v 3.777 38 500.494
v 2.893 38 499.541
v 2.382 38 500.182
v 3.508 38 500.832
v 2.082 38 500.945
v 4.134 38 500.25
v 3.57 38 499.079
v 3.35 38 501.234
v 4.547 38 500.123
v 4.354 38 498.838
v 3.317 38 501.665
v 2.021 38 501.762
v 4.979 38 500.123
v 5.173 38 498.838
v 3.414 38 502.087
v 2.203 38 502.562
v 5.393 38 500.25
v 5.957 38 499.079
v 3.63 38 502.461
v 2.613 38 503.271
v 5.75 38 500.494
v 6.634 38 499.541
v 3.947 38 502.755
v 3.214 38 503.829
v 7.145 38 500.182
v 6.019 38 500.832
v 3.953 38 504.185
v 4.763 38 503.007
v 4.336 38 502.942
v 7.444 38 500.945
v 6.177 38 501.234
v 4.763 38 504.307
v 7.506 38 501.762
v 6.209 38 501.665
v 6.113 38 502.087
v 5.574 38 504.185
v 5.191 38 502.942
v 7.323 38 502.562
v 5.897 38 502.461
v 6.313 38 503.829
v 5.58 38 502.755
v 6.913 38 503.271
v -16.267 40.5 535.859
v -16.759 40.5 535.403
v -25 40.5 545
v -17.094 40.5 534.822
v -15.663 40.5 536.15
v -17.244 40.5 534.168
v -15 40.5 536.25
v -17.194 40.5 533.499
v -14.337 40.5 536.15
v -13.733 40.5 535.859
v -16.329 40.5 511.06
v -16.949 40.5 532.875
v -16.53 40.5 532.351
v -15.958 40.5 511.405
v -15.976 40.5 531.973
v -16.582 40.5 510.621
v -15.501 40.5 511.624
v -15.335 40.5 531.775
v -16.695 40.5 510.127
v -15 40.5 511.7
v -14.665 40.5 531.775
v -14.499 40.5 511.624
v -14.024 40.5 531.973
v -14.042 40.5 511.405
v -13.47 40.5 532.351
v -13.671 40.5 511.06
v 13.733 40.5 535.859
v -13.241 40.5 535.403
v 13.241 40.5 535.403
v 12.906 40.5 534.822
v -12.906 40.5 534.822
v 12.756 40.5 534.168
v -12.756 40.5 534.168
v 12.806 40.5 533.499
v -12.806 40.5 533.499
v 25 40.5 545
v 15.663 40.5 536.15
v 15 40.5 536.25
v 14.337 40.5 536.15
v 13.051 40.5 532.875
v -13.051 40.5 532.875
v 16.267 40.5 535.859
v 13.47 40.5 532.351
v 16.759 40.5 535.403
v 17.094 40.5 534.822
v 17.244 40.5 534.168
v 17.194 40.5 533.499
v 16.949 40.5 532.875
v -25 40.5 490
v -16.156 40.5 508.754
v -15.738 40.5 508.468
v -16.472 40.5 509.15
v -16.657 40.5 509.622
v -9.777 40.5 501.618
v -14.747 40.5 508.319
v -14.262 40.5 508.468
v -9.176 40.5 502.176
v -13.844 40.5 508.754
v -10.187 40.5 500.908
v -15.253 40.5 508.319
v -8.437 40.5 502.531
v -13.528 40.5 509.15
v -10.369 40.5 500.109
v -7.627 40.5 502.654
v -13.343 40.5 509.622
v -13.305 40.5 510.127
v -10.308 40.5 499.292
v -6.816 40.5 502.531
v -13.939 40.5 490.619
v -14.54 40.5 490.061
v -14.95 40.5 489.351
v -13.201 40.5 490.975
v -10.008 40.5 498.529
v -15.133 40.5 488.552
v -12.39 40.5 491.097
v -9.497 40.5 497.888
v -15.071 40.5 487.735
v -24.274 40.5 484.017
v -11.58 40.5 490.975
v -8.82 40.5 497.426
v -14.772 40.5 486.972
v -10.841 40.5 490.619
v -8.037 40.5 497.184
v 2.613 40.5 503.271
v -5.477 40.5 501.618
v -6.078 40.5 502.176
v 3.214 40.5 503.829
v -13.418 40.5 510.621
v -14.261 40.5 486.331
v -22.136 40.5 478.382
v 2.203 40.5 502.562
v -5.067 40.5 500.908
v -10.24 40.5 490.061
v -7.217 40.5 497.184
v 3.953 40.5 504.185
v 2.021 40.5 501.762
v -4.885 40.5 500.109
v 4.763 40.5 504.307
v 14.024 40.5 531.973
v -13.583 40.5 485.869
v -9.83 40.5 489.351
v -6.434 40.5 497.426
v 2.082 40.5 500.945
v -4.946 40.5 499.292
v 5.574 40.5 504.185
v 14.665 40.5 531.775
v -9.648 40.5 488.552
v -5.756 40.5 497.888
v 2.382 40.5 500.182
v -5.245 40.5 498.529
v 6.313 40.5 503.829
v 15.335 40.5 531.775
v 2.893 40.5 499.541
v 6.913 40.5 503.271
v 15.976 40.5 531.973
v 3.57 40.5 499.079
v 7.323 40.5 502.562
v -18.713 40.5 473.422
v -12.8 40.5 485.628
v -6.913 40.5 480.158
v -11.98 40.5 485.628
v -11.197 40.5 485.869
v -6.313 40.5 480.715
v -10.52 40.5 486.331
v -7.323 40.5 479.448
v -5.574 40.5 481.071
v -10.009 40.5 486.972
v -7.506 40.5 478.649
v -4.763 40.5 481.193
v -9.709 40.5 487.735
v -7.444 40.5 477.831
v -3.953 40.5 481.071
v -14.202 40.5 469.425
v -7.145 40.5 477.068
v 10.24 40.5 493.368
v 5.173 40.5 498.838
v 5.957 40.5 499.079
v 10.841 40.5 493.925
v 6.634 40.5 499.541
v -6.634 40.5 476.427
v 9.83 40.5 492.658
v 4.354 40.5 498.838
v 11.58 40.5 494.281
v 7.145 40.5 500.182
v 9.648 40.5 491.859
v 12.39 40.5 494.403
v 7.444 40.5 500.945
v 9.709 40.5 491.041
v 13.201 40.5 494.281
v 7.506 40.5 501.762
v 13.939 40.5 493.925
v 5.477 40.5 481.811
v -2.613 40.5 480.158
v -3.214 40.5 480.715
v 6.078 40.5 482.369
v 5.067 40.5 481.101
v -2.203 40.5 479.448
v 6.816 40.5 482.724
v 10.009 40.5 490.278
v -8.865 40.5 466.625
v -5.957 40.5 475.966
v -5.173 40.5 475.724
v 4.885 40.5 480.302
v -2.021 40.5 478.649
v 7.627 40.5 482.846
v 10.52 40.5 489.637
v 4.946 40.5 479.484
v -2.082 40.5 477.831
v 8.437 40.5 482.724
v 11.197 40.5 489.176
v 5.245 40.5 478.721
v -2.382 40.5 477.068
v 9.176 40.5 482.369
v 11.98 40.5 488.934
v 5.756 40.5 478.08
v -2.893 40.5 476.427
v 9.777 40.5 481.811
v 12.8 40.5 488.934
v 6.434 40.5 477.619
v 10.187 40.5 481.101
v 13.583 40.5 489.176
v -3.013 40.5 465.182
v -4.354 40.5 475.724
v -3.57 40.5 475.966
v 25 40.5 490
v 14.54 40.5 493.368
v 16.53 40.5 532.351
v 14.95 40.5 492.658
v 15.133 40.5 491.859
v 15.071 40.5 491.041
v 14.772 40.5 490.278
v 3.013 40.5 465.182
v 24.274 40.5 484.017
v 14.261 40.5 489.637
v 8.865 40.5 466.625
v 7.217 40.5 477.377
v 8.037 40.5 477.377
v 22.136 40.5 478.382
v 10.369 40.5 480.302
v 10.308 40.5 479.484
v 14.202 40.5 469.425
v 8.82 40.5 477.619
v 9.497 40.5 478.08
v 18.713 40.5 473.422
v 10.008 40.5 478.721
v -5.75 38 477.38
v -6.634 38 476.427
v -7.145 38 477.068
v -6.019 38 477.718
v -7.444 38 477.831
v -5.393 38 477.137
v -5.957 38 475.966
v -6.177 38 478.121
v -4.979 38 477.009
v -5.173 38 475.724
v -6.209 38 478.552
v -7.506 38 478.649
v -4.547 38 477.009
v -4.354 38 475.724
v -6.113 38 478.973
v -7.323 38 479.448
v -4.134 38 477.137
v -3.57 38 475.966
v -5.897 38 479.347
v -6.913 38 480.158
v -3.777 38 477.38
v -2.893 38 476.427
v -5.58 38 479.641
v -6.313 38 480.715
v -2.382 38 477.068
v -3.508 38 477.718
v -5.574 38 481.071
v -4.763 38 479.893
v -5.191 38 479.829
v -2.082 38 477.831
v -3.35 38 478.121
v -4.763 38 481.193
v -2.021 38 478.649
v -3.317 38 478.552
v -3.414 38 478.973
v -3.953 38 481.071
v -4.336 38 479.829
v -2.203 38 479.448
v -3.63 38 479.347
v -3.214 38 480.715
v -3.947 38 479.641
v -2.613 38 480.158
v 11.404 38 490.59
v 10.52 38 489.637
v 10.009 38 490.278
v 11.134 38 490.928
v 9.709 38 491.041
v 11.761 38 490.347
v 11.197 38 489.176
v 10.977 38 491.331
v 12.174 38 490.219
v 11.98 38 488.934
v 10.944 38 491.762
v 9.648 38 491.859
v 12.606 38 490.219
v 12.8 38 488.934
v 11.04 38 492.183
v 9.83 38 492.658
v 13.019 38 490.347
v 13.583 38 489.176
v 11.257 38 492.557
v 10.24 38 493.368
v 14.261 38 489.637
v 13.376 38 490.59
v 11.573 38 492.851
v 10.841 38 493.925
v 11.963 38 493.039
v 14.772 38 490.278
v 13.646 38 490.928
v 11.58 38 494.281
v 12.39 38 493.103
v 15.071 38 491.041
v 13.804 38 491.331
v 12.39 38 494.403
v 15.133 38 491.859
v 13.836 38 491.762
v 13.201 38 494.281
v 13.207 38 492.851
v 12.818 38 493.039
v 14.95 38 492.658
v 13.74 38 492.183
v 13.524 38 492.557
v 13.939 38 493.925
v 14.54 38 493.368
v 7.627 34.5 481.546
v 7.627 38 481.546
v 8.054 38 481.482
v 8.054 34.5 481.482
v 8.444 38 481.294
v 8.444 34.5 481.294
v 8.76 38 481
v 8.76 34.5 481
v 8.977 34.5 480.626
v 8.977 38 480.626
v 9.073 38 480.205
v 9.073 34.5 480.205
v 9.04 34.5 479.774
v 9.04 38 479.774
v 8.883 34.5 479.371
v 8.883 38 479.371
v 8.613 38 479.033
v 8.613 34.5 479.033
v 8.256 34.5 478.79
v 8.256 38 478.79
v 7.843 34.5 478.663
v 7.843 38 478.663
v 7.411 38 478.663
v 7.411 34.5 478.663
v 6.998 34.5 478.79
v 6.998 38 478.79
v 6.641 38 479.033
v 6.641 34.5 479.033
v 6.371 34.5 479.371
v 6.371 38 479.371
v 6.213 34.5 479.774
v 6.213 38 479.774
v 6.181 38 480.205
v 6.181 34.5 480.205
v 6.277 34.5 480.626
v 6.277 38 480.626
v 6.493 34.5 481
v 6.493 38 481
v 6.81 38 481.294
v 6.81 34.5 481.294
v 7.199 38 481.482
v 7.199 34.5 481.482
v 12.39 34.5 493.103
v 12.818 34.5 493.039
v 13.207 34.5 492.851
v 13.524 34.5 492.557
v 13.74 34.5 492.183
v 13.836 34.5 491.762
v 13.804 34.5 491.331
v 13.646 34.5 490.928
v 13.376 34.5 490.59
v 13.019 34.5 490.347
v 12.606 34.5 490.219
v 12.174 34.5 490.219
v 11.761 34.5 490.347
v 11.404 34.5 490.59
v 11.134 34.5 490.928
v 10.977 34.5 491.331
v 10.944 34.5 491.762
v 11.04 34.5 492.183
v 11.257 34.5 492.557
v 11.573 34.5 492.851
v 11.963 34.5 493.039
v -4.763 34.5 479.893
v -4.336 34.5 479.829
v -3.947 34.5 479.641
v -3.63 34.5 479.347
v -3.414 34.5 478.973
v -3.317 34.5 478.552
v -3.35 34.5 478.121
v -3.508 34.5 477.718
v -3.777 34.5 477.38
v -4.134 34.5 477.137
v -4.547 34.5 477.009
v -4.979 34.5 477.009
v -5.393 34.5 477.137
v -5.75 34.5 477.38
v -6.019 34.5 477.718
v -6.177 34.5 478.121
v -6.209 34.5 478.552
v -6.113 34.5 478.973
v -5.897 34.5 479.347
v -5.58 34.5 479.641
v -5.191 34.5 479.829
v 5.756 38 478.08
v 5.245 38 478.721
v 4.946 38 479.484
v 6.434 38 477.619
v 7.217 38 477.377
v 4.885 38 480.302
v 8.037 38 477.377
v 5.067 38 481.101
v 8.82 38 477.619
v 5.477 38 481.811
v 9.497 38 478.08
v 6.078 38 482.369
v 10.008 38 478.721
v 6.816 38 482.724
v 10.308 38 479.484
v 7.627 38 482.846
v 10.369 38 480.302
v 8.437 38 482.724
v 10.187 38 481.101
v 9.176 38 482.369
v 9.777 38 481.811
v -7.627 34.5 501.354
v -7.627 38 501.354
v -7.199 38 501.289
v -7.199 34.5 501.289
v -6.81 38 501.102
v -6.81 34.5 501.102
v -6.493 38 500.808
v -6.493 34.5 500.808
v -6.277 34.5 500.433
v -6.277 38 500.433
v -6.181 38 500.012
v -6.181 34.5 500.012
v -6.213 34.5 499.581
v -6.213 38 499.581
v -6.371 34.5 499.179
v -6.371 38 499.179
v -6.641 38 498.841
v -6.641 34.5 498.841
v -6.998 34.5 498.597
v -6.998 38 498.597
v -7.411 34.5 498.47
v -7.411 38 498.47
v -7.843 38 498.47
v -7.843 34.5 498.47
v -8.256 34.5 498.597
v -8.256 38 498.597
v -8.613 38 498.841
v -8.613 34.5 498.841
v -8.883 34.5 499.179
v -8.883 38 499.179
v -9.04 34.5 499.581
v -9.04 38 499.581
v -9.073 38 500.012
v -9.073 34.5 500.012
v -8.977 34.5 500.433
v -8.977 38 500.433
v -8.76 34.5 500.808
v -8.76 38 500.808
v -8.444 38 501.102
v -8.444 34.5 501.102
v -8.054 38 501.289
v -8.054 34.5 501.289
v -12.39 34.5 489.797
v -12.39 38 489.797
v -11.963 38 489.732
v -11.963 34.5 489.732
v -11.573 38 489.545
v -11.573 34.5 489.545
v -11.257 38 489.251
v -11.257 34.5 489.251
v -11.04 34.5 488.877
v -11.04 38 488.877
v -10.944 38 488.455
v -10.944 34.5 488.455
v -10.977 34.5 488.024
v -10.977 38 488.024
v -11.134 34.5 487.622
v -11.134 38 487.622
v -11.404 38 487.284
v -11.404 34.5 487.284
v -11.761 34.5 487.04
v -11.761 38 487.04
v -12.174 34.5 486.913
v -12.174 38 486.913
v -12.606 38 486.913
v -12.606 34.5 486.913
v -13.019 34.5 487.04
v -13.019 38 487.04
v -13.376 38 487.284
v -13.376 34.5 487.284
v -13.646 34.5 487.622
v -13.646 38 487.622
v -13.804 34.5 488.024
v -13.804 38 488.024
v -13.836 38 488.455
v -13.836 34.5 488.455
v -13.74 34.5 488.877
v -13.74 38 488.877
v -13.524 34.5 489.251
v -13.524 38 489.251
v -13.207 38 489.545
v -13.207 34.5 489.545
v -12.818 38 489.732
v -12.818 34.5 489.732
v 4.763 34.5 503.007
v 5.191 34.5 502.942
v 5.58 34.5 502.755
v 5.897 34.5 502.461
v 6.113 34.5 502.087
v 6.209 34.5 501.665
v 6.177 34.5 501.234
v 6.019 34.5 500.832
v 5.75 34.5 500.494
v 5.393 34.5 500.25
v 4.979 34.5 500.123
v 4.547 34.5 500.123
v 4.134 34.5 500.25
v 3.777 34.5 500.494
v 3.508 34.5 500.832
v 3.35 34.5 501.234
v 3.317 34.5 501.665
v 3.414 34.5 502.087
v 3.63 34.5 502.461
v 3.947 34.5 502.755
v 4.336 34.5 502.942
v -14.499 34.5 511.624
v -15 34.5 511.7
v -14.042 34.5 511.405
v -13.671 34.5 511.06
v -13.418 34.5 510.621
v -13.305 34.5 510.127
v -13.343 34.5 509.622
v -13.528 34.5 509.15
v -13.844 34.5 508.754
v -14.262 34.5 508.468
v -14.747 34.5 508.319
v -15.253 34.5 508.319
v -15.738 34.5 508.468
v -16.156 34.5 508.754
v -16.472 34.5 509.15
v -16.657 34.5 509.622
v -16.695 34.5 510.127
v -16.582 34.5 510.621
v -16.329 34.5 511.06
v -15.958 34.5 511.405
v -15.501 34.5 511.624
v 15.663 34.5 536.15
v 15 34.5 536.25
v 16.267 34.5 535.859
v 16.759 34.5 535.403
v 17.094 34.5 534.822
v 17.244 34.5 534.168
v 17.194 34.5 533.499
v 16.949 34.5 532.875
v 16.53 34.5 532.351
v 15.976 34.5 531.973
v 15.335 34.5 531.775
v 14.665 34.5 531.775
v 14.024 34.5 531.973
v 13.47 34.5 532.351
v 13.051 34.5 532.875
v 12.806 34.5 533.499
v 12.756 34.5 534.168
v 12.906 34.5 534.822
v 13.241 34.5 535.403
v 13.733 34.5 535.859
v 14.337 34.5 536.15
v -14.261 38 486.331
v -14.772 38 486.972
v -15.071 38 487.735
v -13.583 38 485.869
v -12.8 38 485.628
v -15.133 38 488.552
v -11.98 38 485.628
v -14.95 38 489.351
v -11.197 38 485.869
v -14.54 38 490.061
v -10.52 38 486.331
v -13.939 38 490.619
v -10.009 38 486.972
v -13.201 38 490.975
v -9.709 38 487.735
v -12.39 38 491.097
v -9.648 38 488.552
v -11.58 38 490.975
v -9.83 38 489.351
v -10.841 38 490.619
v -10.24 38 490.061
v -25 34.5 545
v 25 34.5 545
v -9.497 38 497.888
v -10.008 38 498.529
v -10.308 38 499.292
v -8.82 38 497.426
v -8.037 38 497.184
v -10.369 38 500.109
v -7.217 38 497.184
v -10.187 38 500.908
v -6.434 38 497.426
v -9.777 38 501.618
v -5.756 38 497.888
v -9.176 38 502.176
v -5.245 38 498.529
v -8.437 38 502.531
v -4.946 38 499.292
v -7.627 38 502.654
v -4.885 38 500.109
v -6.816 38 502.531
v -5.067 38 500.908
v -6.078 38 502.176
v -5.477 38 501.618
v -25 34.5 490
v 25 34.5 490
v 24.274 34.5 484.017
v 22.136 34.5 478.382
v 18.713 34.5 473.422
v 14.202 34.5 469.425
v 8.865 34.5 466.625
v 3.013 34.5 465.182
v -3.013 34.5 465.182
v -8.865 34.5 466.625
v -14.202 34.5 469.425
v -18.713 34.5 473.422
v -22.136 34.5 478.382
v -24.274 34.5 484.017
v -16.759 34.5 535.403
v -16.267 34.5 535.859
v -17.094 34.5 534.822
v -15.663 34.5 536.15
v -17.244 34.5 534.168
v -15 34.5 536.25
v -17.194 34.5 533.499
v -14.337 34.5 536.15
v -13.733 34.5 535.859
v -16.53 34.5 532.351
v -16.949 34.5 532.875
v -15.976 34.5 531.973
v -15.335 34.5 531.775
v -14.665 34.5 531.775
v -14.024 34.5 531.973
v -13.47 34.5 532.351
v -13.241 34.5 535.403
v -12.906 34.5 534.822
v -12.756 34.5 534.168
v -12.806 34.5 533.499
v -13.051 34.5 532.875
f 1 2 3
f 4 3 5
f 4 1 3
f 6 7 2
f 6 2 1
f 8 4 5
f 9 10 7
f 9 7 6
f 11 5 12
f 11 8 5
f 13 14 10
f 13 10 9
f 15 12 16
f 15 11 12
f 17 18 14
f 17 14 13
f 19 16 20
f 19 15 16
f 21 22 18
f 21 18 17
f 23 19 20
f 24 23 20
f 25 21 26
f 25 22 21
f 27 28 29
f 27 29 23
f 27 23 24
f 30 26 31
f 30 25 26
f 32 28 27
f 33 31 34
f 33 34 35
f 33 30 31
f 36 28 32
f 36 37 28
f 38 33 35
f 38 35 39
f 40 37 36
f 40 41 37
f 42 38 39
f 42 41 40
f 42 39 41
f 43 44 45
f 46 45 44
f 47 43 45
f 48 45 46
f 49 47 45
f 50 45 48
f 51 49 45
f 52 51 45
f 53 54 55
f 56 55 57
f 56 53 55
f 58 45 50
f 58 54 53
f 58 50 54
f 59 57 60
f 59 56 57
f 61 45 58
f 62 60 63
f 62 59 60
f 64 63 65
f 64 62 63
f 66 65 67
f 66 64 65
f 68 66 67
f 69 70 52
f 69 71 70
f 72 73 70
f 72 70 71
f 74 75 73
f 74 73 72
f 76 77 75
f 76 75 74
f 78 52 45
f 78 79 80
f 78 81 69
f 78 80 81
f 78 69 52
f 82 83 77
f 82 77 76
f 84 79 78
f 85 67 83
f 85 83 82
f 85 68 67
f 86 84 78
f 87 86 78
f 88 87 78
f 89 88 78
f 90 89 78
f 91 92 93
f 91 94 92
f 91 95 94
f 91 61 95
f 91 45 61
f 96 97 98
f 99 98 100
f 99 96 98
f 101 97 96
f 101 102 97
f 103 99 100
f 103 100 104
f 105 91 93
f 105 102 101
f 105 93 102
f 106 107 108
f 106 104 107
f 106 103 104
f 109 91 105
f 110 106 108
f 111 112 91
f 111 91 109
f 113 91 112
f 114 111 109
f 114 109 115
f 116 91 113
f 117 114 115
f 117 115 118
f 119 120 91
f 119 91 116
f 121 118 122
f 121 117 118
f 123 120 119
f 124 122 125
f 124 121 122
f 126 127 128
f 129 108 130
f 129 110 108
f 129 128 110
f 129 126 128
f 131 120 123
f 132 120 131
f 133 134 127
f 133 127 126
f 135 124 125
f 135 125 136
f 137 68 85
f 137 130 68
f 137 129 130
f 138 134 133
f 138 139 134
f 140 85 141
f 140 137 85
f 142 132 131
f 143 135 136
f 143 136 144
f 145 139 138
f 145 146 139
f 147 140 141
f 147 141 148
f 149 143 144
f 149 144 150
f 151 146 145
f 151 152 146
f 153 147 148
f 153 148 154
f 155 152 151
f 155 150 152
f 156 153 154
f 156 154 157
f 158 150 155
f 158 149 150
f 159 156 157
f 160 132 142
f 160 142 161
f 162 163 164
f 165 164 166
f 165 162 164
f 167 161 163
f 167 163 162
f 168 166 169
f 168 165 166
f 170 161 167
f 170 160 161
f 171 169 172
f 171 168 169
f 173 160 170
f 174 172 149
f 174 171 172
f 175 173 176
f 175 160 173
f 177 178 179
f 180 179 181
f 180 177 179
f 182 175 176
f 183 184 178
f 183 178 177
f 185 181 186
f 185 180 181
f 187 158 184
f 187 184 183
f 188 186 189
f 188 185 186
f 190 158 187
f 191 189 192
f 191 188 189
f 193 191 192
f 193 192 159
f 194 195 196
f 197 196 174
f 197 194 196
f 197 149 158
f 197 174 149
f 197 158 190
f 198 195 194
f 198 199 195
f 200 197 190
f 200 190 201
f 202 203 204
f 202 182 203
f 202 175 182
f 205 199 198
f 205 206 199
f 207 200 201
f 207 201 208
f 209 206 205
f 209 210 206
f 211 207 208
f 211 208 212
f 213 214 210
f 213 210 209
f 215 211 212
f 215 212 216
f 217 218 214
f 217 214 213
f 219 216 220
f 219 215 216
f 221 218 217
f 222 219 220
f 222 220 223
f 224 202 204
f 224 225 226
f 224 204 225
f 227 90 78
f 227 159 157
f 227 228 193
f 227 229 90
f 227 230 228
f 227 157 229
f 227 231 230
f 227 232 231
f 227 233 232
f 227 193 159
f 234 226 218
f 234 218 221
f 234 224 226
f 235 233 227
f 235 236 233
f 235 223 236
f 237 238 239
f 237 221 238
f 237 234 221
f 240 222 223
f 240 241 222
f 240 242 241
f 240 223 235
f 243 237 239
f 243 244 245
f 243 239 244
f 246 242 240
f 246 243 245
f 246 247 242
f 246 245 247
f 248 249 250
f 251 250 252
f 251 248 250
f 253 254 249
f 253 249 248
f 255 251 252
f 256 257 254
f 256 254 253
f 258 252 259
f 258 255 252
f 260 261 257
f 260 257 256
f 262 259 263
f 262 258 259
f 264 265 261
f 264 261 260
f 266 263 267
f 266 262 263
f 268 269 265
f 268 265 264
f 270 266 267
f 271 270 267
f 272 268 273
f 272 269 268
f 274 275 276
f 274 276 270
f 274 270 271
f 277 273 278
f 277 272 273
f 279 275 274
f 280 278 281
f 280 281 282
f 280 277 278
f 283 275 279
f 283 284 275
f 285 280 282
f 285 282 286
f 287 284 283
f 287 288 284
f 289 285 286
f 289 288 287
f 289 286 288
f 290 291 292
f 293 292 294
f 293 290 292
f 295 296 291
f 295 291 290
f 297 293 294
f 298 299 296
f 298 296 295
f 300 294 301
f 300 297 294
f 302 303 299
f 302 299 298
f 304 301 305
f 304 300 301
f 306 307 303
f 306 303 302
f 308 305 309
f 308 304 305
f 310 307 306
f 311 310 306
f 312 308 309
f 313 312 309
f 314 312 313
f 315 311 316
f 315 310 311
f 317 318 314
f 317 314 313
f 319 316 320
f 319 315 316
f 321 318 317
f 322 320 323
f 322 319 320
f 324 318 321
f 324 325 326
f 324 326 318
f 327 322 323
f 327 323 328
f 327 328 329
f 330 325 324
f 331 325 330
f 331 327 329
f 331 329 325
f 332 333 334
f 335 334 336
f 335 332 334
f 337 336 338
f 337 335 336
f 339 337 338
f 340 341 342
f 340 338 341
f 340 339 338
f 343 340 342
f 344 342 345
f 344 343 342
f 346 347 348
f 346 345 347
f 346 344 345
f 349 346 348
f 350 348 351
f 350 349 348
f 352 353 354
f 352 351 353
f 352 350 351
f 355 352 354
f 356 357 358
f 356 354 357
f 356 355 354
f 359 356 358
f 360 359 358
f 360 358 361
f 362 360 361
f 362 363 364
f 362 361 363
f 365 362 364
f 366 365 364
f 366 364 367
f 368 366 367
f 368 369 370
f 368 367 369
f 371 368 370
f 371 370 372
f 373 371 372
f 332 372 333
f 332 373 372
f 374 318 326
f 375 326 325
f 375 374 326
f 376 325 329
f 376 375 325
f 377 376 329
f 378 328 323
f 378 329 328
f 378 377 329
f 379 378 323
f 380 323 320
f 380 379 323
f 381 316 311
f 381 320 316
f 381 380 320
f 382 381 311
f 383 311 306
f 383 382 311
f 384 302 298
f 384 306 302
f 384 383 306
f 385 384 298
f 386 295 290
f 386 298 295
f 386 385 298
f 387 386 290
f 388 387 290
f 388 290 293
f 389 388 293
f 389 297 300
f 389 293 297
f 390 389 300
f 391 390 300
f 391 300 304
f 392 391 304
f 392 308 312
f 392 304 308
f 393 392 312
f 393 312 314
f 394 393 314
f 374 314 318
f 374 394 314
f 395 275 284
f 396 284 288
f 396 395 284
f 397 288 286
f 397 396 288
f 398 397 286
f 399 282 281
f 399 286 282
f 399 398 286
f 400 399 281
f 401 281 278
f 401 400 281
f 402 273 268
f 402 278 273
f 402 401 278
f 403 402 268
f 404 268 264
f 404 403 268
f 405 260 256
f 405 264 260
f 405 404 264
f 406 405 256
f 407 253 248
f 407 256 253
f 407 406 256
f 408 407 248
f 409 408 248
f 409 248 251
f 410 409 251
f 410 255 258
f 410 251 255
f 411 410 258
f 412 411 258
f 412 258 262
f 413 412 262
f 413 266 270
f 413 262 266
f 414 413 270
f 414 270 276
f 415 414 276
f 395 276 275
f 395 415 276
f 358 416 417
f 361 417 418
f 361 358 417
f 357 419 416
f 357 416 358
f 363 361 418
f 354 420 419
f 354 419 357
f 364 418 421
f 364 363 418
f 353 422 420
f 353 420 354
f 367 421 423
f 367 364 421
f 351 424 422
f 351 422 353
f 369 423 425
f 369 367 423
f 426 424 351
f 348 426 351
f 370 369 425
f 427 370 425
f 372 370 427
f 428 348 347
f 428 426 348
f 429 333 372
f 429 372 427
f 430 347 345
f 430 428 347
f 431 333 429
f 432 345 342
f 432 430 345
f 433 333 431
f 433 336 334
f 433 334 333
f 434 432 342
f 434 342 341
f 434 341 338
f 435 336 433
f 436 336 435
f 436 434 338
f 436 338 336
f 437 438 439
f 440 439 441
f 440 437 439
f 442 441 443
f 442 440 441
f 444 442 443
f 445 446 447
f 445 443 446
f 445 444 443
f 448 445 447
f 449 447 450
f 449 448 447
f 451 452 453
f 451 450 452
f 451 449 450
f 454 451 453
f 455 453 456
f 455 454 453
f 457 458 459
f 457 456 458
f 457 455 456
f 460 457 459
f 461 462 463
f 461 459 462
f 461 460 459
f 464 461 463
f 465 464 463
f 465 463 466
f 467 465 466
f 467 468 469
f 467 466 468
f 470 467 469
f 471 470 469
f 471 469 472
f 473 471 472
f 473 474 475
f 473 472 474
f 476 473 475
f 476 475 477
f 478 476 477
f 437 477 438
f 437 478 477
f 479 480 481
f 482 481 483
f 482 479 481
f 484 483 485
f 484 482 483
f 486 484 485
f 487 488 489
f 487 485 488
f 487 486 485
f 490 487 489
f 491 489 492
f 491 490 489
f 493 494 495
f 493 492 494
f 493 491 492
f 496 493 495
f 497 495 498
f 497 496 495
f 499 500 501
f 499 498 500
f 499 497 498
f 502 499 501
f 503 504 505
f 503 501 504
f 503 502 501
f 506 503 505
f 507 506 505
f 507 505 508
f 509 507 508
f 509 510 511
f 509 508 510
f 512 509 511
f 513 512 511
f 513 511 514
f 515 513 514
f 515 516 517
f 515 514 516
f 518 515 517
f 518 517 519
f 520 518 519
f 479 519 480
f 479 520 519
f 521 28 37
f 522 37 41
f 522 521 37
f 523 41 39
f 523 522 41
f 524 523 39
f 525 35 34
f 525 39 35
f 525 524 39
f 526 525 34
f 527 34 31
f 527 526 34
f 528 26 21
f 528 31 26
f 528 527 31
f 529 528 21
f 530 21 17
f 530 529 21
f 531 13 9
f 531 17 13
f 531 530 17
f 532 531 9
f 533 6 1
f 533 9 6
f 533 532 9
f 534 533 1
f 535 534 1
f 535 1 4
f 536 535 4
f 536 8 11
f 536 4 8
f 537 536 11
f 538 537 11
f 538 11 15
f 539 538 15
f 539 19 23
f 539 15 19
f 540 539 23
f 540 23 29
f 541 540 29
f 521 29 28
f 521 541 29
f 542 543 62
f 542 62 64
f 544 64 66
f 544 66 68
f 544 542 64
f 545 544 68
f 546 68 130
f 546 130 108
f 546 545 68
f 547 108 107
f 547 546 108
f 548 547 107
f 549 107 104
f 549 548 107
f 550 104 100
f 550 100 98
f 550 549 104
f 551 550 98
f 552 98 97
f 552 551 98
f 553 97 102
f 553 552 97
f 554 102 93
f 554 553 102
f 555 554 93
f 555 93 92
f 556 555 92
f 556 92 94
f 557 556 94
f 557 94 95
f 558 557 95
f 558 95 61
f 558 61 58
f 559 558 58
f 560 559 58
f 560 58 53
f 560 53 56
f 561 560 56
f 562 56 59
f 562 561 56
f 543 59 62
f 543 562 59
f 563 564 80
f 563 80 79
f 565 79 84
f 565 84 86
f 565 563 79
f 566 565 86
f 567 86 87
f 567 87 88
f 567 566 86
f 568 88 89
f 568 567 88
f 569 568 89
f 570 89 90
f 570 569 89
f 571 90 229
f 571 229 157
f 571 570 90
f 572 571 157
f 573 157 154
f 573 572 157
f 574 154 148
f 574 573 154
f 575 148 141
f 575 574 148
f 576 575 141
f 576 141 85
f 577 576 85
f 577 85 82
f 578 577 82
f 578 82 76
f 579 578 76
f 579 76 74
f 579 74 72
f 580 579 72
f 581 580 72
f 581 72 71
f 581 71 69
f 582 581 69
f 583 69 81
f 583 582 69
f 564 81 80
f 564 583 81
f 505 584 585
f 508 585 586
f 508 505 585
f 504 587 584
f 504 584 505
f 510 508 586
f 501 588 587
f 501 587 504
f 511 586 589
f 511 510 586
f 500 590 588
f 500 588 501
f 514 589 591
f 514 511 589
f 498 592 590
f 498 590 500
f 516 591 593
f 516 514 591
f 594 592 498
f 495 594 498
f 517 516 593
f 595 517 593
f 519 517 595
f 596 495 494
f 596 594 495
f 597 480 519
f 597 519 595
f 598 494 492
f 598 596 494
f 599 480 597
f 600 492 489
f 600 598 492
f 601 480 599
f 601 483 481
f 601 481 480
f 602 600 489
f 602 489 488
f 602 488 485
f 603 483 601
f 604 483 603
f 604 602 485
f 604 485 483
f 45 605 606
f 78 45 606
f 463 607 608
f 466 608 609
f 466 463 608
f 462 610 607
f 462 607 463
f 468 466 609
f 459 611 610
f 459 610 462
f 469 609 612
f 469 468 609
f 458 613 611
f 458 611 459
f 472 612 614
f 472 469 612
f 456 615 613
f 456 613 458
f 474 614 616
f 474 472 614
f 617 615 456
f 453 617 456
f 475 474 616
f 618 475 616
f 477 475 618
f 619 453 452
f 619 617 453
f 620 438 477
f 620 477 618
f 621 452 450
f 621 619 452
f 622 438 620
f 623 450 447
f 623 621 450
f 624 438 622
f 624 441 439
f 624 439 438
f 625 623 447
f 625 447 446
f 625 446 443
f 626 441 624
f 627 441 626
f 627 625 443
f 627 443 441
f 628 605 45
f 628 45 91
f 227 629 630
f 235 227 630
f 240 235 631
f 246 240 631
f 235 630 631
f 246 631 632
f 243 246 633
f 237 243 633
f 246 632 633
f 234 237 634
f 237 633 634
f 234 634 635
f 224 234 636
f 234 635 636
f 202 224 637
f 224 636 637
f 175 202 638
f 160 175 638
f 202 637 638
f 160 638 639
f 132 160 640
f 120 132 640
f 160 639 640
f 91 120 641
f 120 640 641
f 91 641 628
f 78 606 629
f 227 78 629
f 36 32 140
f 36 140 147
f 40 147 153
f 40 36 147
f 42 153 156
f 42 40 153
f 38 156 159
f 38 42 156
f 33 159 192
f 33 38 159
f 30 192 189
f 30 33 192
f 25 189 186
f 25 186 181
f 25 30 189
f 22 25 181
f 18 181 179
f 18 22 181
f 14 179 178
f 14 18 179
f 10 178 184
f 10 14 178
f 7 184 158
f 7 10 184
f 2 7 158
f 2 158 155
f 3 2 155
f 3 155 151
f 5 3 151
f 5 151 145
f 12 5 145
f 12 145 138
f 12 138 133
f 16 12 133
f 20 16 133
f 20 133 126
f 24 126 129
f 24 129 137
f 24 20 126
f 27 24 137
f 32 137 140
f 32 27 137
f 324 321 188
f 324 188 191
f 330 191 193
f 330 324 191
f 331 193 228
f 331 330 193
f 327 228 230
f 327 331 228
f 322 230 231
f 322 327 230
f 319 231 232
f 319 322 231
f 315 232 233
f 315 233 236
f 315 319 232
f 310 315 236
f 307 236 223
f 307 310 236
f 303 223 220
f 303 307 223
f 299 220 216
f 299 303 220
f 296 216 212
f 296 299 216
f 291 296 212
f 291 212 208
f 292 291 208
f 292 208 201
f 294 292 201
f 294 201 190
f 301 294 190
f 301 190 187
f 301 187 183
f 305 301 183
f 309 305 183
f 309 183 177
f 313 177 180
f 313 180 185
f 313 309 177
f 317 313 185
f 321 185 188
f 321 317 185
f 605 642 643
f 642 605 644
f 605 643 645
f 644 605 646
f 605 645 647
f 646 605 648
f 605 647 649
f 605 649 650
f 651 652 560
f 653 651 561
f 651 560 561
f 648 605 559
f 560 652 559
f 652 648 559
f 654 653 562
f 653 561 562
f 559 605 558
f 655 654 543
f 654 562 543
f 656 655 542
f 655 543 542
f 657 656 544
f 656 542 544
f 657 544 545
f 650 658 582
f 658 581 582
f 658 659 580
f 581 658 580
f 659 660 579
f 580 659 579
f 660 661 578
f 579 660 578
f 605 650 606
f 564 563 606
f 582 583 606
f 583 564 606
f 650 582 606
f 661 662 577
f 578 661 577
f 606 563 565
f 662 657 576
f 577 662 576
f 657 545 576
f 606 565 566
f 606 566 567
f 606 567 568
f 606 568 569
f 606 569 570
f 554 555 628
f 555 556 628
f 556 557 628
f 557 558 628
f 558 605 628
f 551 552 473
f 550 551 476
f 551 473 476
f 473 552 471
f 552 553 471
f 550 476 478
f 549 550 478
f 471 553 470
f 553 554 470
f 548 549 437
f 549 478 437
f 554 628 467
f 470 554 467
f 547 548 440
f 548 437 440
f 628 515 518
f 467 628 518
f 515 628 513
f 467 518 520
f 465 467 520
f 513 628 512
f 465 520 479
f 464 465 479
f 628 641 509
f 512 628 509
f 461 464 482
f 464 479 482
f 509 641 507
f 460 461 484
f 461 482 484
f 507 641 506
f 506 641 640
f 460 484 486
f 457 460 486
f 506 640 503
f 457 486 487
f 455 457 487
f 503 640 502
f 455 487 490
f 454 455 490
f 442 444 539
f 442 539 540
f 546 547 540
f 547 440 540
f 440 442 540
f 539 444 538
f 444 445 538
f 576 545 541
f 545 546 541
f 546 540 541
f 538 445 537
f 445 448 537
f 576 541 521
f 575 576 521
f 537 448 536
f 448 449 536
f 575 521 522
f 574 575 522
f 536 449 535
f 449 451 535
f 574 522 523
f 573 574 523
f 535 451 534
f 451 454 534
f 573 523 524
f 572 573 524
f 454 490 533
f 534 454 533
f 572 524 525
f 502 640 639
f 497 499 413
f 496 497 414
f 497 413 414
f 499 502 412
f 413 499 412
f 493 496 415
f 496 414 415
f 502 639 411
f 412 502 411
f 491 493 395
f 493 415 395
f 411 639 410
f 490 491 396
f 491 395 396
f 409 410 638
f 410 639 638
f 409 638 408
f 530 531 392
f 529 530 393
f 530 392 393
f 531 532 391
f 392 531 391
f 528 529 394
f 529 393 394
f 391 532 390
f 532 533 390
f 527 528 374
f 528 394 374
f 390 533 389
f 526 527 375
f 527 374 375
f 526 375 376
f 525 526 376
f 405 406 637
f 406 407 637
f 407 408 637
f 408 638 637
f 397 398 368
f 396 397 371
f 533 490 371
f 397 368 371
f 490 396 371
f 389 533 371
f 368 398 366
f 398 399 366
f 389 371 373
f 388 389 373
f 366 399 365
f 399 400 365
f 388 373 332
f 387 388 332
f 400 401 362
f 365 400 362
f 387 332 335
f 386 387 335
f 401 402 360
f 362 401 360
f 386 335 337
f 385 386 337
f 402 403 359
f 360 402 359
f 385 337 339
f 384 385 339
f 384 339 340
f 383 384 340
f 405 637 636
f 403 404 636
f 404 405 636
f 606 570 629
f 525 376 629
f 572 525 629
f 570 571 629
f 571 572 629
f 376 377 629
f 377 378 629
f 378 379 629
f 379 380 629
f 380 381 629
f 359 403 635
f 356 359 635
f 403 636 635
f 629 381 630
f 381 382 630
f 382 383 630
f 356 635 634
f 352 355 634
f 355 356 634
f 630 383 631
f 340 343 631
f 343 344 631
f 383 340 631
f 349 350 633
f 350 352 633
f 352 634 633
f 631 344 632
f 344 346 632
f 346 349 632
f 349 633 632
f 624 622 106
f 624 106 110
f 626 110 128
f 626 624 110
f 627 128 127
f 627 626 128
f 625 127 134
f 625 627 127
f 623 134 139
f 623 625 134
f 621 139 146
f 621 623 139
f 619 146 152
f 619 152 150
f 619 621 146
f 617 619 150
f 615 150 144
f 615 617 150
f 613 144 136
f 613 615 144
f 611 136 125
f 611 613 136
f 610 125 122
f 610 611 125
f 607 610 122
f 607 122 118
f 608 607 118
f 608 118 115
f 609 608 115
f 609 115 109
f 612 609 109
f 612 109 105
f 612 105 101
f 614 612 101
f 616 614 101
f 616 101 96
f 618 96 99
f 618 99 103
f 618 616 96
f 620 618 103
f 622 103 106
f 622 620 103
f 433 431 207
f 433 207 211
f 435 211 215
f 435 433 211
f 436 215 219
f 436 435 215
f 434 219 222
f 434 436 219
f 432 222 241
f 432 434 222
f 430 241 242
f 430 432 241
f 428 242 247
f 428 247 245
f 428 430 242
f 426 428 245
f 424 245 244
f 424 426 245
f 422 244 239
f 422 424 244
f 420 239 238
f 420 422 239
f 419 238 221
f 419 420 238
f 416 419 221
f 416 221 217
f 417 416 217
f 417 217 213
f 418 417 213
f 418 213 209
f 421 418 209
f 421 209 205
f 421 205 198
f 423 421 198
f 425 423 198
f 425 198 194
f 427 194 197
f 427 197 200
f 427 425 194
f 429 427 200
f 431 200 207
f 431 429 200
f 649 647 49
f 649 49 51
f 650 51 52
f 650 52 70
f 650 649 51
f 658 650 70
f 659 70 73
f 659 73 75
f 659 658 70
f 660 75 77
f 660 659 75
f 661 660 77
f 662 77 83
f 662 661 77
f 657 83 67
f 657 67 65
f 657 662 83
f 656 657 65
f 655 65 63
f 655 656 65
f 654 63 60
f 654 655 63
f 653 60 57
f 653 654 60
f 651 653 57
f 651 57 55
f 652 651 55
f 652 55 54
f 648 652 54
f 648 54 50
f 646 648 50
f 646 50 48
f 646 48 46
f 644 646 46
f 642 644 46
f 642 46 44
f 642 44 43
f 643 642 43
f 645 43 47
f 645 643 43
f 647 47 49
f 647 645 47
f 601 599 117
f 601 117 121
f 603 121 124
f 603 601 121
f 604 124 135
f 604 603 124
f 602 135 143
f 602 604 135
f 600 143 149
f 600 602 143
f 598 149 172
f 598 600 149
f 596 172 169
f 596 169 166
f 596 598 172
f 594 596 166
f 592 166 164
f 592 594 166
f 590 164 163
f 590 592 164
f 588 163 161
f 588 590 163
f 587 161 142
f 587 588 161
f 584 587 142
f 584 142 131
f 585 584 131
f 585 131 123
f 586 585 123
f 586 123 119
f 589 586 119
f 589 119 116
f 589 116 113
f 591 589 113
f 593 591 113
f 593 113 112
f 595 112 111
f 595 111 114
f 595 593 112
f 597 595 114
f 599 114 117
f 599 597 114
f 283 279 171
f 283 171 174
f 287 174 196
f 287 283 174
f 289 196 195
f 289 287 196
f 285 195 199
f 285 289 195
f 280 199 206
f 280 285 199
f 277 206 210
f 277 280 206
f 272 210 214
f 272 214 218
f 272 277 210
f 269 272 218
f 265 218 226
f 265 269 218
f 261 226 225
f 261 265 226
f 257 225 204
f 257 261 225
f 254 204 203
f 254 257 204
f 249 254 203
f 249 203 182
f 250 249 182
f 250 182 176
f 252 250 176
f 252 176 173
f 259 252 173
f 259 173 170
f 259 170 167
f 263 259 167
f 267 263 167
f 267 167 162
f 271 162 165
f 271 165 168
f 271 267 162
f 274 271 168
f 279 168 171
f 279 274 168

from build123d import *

# Parameters (mm, degrees)
PLACA_START                 = 34.5
SK_PLACA_W                  = 50
SK_PLACA_H                  = 36
PLACA_DEPTH                 = 6
EXTREMO_START               = 34.5
SK_EXTREMO_R                = 25
EXTREMO_DEPTH               = 6
PASANTES_M2_5_CUBO_J5_START = 34.5
SK_PASANTES_M2_5_CUBO_J5_R  = 1.45
PASANTES_M2_5_CUBO_J5_DEPTH = 6
CAJAS_M2_5_J5_START         = 38
SK_CAJAS_M2_5_J5_R          = 2.75
CAJAS_M2_5_J5_DEPTH         = 2.5
EXTENSION_PESTANAS_START    = 34.5
SK_EXTENSION_PESTANAS_W     = 50
SK_EXTENSION_PESTANAS_H     = 19
EXTENSION_PESTANAS_DEPTH    = 6
PASANTES_M4_REPISA_START    = 34.5
SK_PASANTES_M4_REPISA_R     = 2.25
PASANTES_M4_REPISA_DEPTH    = 6
PASANTE_M3_CINCHO_START     = 34.5
SK_PASANTE_M3_CINCHO_R      = 1.7
PASANTE_M3_CINCHO_DEPTH     = 6


with BuildPart() as part:
    # Sk_Placa → Placa (new body)
    with BuildSketch(Plane(origin=(0, 0, 0), x_dir=(1, 0, 0), z_dir=(0, 1, 0)).offset(PLACA_START)):
        with Locations((0, -508)):
            Rectangle(SK_PLACA_W, SK_PLACA_H)
    extrude(amount=PLACA_DEPTH)

    # Sk_Extremo → Extremo (add)
    with BuildSketch(Plane(origin=(0, 0, 0), x_dir=(1, 0, 0), z_dir=(0, 1, 0)).offset(EXTREMO_START)):
        with Locations((0, -490)):
            Circle(SK_EXTREMO_R)
    extrude(amount=EXTREMO_DEPTH)

    # Sk_Pasantes_M2-5_cubo_J5 → Pasantes_M2-5_cubo_J5 (cut)
    with BuildSketch(Plane(origin=(0, 0, 0), x_dir=(1, 0, 0), z_dir=(0, 1, 0)).offset(PASANTES_M2_5_CUBO_J5_START)):
        with Locations(Location((12.390194253, -491.653204878, 0), (0, 0, 270))):
            Circle(SK_PASANTES_M2_5_CUBO_J5_R)
        with Locations(Location((4.763379704, -501.55682542, 0), (0, 0, 270))):
            Circle(SK_PASANTES_M2_5_CUBO_J5_R)
        with Locations(Location((-7.626814549, -499.903620542, 0), (0, 0, 270))):
            Circle(SK_PASANTES_M2_5_CUBO_J5_R)
        with Locations(Location((-12.390194253, -488.346795122, 0), (0, 0, 270))):
            Circle(SK_PASANTES_M2_5_CUBO_J5_R)
        with Locations(Location((-4.763379704, -478.44317458, 0), (0, 0, 270))):
            Circle(SK_PASANTES_M2_5_CUBO_J5_R)
        with Locations(Location((7.626814549, -480.096379458, 0), (0, 0, 270))):
            Circle(SK_PASANTES_M2_5_CUBO_J5_R)
    extrude(amount=PASANTES_M2_5_CUBO_J5_DEPTH, mode=Mode.SUBTRACT)

    # Sk_Cajas_M2-5_J5 → Cajas_M2-5_J5 (cut)
    with BuildSketch(Plane(origin=(0, 0, 0), x_dir=(1, 0, 0), z_dir=(0, 1, 0)).offset(CAJAS_M2_5_J5_START)):
        with Locations(Location((12.390194253, -491.653204878, 0), (0, 0, 270))):
            Circle(SK_CAJAS_M2_5_J5_R)
        with Locations(Location((4.763379704, -501.55682542, 0), (0, 0, 270))):
            Circle(SK_CAJAS_M2_5_J5_R)
        with Locations(Location((-7.626814549, -499.903620542, 0), (0, 0, 270))):
            Circle(SK_CAJAS_M2_5_J5_R)
        with Locations(Location((-12.390194253, -488.346795122, 0), (0, 0, 270))):
            Circle(SK_CAJAS_M2_5_J5_R)
        with Locations(Location((-4.763379704, -478.44317458, 0), (0, 0, 270))):
            Circle(SK_CAJAS_M2_5_J5_R)
        with Locations(Location((7.626814549, -480.096379458, 0), (0, 0, 270))):
            Circle(SK_CAJAS_M2_5_J5_R)
    extrude(amount=CAJAS_M2_5_J5_DEPTH, mode=Mode.SUBTRACT)

    # Sk_Extension_pestanas → Extension_pestanas (add)
    with BuildSketch(Plane(origin=(0, 0, 0), x_dir=(1, 0, 0), z_dir=(0, 1, 0)).offset(EXTENSION_PESTANAS_START)):
        with Locations((0, -535.5)):
            Rectangle(SK_EXTENSION_PESTANAS_W, SK_EXTENSION_PESTANAS_H)
    extrude(amount=EXTENSION_PESTANAS_DEPTH)

    # Sk_Pasantes_M4_repisa → Pasantes_M4_repisa (cut)
    with BuildSketch(Plane(origin=(0, 0, 0), x_dir=(1, 0, 0), z_dir=(0, 1, 0)).offset(PASANTES_M4_REPISA_START)):
        with Locations(Location((-15, -534, 0), (0, 0, 270))):
            Circle(SK_PASANTES_M4_REPISA_R)
        with Locations(Location((15, -534, 0), (0, 0, 270))):
            Circle(SK_PASANTES_M4_REPISA_R)
    extrude(amount=PASANTES_M4_REPISA_DEPTH, mode=Mode.SUBTRACT)

    # Sk_Pasante_M3_cincho → Pasante_M3_cincho (cut)
    with BuildSketch(Plane(origin=(0, 0, 0), x_dir=(1, 0, 0), z_dir=(0, 1, 0)).offset(PASANTE_M3_CINCHO_START)):
        with Locations(Location((-15, -510, 0), (0, 0, 270))):
            Circle(SK_PASANTE_M3_CINCHO_R)
    extrude(amount=PASANTE_M3_CINCHO_DEPTH, mode=Mode.SUBTRACT)


solid = part.part
